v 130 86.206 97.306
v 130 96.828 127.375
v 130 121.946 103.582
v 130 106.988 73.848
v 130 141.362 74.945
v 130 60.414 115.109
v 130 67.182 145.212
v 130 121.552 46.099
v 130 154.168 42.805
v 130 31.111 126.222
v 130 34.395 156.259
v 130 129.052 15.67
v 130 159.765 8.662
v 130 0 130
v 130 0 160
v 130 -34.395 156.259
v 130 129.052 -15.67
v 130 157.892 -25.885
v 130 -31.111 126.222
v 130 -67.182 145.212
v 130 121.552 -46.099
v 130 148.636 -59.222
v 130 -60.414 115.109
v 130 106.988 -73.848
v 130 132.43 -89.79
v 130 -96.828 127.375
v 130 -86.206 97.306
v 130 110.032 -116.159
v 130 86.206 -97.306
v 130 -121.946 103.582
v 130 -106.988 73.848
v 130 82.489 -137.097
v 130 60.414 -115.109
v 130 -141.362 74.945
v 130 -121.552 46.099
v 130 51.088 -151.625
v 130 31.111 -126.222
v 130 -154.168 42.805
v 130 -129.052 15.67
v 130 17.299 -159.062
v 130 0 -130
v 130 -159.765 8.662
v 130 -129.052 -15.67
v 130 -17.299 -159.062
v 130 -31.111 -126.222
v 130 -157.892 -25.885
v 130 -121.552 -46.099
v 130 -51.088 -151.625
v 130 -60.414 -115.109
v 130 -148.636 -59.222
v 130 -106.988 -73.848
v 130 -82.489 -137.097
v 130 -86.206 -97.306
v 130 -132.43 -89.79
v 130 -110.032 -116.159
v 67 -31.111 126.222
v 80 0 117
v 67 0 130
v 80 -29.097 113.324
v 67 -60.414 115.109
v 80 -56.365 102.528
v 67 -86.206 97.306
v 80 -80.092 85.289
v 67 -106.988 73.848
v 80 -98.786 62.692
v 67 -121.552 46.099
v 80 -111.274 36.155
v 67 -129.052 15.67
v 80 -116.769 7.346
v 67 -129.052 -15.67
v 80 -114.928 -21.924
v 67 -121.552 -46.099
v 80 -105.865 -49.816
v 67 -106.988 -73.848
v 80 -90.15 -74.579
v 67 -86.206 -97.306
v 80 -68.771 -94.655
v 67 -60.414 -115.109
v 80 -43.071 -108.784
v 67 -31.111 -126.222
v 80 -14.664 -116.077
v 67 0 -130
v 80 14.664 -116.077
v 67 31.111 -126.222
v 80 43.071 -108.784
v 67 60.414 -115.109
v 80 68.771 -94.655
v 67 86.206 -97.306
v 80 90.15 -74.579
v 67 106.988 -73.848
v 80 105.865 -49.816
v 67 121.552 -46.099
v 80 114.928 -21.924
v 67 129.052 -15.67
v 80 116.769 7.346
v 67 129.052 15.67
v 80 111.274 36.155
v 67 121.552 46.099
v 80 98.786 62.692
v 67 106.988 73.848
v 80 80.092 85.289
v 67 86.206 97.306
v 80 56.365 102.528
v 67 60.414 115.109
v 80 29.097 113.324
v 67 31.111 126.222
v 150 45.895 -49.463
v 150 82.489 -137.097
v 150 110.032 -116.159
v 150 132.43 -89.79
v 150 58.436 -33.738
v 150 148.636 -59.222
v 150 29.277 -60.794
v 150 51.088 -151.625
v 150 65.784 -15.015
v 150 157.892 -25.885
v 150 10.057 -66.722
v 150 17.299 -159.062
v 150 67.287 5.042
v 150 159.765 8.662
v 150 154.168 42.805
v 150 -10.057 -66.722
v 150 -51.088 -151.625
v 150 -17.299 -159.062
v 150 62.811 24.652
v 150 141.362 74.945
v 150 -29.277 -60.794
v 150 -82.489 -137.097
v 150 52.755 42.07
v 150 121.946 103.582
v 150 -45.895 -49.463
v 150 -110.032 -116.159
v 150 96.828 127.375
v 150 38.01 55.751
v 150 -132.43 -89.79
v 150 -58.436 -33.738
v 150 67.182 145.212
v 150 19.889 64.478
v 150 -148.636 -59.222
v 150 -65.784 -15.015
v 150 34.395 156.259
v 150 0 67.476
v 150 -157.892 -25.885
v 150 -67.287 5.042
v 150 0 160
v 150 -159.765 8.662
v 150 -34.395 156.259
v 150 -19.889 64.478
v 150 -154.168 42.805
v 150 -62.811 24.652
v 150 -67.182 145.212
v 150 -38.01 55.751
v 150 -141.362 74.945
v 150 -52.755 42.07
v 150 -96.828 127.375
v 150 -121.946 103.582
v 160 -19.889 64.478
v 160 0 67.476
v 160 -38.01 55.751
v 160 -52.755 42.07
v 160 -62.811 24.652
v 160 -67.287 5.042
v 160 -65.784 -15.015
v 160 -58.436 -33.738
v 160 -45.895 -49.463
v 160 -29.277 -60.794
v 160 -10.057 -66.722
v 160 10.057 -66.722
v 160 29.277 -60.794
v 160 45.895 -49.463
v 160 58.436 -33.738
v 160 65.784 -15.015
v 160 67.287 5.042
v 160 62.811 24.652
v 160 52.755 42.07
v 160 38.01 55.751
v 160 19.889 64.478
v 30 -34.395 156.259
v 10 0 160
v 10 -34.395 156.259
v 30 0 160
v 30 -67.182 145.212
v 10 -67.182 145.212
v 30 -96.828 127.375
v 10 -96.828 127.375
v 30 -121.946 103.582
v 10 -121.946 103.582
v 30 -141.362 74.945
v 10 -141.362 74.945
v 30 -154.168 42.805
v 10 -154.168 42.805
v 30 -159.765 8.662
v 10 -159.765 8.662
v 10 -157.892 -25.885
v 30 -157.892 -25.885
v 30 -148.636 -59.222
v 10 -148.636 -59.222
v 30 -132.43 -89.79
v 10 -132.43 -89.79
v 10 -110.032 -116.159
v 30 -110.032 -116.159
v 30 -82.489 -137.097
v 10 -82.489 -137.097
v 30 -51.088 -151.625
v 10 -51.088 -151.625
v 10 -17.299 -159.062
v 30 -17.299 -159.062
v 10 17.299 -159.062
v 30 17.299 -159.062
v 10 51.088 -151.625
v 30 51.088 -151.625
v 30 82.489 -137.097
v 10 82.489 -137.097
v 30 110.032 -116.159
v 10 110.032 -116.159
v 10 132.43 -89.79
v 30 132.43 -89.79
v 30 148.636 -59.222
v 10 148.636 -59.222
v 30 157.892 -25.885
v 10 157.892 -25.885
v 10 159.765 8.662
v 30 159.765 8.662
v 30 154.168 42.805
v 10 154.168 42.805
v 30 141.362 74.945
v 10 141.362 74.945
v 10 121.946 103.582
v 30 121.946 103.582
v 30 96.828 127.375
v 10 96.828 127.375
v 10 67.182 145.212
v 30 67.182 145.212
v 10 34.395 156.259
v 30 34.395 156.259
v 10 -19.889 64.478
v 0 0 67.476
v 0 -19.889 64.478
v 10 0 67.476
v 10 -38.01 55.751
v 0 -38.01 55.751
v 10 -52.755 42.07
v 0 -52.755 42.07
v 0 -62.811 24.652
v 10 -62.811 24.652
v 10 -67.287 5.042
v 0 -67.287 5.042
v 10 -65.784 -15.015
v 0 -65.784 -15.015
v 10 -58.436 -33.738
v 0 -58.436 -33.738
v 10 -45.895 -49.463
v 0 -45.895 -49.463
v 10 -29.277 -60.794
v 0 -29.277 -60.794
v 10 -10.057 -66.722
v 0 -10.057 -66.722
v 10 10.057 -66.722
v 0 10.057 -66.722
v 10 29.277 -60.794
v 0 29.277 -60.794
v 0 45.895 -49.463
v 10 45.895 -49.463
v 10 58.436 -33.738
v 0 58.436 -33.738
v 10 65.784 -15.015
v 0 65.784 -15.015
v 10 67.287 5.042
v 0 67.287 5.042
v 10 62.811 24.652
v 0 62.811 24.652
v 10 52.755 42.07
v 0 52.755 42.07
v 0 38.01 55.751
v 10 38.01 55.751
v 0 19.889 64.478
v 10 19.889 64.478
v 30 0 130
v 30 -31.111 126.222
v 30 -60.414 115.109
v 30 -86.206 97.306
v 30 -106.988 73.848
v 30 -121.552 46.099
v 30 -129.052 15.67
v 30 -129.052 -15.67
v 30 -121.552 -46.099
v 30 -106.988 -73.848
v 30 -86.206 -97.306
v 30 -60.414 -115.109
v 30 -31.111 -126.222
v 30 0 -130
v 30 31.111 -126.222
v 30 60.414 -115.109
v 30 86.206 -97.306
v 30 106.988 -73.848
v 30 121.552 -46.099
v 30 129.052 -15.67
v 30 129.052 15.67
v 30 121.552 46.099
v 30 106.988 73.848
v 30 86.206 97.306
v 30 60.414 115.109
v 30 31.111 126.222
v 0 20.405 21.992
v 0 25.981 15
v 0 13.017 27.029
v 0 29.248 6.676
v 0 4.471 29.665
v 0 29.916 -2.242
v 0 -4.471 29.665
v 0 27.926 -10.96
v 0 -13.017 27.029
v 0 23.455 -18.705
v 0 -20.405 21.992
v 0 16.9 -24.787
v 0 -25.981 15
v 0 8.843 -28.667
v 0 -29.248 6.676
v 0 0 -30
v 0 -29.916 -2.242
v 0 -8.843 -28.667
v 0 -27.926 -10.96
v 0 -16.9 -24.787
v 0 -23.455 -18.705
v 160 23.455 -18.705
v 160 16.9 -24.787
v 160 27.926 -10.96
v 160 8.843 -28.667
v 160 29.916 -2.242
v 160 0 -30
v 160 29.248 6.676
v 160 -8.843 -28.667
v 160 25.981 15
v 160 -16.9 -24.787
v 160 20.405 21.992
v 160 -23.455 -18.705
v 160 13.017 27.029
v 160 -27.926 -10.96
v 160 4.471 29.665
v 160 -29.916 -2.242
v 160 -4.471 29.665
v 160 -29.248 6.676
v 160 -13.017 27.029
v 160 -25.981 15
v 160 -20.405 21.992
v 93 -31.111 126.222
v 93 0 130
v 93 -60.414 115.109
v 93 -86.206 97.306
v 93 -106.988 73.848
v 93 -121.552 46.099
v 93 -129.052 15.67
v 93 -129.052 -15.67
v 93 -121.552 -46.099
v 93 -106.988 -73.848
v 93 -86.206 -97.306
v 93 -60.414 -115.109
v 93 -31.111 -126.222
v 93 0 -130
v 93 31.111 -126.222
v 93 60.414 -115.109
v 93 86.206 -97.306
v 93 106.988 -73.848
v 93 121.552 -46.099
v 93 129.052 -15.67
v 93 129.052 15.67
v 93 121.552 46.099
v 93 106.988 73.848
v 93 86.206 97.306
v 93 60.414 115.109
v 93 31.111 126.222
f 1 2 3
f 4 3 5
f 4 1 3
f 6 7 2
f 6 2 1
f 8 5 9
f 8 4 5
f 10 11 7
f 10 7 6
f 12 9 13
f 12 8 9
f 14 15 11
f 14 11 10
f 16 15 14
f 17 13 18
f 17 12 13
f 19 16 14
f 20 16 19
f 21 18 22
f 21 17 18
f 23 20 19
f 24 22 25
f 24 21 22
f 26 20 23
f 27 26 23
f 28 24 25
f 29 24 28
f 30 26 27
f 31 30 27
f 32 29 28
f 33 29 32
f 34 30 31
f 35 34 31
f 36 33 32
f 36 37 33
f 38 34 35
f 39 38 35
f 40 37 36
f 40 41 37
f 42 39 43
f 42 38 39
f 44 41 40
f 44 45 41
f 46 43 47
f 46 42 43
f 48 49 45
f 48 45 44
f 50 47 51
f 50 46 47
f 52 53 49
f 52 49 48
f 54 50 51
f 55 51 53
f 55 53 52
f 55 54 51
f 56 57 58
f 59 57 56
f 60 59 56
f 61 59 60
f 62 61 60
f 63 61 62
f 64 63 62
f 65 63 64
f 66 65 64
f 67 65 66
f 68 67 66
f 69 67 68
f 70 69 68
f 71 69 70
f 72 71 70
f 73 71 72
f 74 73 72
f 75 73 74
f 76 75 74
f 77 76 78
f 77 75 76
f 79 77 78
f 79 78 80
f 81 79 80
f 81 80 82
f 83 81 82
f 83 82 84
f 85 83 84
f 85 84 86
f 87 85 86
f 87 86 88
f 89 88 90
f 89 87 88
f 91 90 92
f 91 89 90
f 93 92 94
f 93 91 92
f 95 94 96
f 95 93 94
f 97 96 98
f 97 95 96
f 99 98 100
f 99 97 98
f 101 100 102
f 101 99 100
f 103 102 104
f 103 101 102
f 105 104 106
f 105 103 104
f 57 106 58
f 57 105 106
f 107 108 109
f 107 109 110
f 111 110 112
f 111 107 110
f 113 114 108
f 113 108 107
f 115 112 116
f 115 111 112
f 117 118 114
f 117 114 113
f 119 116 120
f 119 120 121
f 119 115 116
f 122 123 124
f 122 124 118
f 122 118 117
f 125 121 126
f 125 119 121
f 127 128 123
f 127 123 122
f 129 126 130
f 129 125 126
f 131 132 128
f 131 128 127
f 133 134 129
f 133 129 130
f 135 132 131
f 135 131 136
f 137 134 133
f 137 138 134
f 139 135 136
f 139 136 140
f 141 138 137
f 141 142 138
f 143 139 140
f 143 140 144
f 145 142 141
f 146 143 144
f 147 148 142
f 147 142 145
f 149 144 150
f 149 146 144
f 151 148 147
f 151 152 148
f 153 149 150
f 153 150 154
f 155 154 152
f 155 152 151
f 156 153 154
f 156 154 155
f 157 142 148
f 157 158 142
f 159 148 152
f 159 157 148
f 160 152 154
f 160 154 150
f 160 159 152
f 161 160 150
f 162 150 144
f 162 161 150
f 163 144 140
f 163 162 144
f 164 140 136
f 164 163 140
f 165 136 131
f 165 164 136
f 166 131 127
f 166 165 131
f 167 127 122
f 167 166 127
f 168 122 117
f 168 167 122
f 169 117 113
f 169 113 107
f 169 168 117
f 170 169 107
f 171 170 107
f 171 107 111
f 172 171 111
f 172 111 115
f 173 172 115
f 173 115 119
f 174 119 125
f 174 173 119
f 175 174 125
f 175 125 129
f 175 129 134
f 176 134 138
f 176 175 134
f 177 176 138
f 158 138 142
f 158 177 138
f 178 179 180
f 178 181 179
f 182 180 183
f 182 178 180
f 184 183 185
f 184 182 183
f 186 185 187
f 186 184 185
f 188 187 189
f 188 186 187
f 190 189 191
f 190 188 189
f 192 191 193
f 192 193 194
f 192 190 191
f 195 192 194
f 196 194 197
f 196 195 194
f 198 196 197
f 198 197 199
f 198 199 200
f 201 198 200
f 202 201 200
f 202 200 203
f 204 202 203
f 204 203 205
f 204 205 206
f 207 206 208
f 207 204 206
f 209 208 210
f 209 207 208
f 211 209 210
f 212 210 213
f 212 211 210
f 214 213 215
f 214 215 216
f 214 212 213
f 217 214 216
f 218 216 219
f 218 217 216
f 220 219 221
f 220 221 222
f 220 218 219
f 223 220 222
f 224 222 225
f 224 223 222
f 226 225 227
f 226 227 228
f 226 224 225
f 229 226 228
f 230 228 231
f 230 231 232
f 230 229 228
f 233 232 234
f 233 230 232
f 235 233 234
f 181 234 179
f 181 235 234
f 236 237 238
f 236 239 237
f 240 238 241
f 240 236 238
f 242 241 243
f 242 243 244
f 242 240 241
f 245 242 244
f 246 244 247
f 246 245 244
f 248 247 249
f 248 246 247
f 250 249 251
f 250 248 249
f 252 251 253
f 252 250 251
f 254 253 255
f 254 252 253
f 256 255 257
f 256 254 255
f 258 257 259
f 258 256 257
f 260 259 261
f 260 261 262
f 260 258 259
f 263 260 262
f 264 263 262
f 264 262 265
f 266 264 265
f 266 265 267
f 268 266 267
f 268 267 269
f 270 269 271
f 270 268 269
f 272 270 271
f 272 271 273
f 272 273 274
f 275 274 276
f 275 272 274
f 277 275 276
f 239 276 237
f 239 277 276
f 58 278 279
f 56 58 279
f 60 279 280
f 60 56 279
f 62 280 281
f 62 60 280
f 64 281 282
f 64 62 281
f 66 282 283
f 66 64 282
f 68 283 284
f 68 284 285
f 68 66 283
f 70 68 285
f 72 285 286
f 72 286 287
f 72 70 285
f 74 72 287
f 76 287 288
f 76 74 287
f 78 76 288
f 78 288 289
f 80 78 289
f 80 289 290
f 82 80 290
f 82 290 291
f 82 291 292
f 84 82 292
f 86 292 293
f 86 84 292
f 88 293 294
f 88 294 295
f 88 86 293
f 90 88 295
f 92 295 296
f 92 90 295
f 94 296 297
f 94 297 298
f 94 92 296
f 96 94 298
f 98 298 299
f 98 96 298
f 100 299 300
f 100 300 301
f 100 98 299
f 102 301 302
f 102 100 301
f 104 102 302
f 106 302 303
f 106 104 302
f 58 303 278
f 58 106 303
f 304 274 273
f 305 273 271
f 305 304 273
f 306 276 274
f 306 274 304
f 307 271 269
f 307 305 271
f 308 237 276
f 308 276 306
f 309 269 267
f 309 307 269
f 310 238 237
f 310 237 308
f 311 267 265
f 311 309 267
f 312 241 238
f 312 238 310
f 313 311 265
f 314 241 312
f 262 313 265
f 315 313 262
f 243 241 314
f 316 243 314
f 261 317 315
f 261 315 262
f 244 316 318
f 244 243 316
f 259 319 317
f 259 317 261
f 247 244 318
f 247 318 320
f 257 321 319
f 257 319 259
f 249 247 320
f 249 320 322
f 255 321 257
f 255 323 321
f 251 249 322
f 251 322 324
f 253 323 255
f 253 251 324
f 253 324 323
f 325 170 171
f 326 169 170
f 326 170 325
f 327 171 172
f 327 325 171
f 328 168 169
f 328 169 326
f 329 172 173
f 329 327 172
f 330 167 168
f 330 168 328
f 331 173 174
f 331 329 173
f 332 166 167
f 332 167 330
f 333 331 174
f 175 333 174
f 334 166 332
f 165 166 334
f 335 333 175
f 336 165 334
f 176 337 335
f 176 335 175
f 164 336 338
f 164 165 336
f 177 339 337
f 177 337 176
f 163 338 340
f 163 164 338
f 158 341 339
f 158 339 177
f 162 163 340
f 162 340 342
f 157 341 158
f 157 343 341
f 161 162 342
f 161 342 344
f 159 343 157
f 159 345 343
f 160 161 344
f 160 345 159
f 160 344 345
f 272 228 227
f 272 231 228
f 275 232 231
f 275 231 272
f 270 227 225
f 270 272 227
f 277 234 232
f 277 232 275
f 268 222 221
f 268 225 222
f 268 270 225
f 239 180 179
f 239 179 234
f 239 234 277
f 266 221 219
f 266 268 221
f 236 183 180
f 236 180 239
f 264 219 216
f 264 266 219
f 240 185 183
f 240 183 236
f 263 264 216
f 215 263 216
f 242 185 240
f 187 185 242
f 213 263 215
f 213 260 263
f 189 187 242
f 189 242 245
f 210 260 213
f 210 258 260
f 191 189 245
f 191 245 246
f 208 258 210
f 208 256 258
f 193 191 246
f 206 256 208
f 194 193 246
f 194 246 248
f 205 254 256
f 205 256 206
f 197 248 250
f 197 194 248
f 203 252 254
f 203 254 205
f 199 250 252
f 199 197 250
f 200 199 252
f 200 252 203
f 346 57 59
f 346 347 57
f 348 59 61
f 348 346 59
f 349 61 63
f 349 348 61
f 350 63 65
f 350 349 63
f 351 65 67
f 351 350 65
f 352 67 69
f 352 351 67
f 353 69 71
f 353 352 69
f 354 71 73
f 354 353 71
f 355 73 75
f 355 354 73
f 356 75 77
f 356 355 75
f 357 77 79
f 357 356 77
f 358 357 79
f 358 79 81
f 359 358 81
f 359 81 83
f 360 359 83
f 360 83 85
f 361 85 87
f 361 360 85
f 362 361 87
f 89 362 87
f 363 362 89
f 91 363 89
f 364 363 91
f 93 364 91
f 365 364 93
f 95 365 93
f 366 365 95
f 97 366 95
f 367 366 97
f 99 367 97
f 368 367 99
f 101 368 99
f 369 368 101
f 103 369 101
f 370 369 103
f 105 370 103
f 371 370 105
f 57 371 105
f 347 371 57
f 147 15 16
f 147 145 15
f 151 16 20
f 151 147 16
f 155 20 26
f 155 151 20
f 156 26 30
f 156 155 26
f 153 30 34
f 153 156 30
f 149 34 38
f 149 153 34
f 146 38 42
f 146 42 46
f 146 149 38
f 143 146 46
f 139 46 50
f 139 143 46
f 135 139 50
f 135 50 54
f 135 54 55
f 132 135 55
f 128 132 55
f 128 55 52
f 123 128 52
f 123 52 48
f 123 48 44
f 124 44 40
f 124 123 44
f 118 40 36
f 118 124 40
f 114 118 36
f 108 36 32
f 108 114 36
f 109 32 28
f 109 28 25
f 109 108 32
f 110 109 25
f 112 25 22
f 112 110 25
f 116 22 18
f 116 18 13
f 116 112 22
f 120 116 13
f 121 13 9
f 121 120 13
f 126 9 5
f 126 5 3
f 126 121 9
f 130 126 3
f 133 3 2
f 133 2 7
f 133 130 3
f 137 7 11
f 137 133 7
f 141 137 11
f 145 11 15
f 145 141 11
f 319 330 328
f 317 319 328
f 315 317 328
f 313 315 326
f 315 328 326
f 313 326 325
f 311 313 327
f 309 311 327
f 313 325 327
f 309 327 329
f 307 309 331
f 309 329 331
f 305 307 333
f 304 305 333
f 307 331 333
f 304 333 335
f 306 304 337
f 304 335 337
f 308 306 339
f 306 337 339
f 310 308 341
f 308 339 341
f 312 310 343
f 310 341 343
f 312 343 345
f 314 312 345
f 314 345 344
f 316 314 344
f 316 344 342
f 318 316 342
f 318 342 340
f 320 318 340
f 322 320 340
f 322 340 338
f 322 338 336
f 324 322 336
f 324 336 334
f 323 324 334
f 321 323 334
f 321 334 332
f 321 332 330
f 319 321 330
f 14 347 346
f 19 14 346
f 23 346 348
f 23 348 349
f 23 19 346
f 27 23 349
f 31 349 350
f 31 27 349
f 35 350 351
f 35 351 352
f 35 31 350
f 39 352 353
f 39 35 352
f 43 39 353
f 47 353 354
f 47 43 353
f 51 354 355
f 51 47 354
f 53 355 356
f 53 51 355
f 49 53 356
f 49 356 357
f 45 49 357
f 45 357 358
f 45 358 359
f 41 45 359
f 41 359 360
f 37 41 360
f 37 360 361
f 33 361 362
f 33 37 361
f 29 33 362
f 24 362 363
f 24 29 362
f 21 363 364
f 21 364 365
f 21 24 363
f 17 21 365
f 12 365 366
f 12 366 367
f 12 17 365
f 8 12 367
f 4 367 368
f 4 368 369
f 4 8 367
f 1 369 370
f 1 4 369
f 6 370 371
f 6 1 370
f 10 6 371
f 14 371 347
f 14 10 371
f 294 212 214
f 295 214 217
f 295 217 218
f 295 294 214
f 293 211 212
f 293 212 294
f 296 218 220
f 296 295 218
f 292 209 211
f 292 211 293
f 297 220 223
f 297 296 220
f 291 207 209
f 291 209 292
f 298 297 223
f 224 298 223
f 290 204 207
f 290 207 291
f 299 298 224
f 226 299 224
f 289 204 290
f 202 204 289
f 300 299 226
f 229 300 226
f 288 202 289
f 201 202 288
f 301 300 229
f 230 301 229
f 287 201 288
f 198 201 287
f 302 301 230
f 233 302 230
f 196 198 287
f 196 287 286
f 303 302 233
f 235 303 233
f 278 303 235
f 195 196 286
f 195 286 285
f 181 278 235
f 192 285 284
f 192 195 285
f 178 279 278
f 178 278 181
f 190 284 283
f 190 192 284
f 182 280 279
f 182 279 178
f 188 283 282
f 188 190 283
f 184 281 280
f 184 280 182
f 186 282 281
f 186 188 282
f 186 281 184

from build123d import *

# Parameters (mm, degrees)
SKETCH2_R          = 30
CUT_EXTRUDE1_DEPTH = 278.128129211


with BuildPart() as part:
    # Sketch1 → Revolve1 (revolve)
    with BuildSketch(Plane.XY, mode=Mode.PRIVATE) as revolve1_sk:
        Polygon((0, 0), (0, 67.475728155), (10, 67.475728155), (10, 160), (30, 160), (30, 130), (67, 130), (80, 117), (93, 130), (130, 130), (130, 160), (150, 160), (150, 67.475728155), (160, 67.475728155), (160, 0), align=None)
    revolve(revolve1_sk.sketch.rotate(Axis((0, 0, 0), (1, 0, 0)), 90), axis=Axis((0, 0, 0), (1, 0, 0)))

    # Sketch2 → Cut-Extrude1 (cut, through all)
    with BuildSketch(Plane(origin=(160, 0, 0), x_dir=(0, 0, -1), z_dir=(1, 0, 0))):
        Circle(SKETCH2_R)
    extrude(amount=-CUT_EXTRUDE1_DEPTH, mode=Mode.SUBTRACT)


solid = part.part
